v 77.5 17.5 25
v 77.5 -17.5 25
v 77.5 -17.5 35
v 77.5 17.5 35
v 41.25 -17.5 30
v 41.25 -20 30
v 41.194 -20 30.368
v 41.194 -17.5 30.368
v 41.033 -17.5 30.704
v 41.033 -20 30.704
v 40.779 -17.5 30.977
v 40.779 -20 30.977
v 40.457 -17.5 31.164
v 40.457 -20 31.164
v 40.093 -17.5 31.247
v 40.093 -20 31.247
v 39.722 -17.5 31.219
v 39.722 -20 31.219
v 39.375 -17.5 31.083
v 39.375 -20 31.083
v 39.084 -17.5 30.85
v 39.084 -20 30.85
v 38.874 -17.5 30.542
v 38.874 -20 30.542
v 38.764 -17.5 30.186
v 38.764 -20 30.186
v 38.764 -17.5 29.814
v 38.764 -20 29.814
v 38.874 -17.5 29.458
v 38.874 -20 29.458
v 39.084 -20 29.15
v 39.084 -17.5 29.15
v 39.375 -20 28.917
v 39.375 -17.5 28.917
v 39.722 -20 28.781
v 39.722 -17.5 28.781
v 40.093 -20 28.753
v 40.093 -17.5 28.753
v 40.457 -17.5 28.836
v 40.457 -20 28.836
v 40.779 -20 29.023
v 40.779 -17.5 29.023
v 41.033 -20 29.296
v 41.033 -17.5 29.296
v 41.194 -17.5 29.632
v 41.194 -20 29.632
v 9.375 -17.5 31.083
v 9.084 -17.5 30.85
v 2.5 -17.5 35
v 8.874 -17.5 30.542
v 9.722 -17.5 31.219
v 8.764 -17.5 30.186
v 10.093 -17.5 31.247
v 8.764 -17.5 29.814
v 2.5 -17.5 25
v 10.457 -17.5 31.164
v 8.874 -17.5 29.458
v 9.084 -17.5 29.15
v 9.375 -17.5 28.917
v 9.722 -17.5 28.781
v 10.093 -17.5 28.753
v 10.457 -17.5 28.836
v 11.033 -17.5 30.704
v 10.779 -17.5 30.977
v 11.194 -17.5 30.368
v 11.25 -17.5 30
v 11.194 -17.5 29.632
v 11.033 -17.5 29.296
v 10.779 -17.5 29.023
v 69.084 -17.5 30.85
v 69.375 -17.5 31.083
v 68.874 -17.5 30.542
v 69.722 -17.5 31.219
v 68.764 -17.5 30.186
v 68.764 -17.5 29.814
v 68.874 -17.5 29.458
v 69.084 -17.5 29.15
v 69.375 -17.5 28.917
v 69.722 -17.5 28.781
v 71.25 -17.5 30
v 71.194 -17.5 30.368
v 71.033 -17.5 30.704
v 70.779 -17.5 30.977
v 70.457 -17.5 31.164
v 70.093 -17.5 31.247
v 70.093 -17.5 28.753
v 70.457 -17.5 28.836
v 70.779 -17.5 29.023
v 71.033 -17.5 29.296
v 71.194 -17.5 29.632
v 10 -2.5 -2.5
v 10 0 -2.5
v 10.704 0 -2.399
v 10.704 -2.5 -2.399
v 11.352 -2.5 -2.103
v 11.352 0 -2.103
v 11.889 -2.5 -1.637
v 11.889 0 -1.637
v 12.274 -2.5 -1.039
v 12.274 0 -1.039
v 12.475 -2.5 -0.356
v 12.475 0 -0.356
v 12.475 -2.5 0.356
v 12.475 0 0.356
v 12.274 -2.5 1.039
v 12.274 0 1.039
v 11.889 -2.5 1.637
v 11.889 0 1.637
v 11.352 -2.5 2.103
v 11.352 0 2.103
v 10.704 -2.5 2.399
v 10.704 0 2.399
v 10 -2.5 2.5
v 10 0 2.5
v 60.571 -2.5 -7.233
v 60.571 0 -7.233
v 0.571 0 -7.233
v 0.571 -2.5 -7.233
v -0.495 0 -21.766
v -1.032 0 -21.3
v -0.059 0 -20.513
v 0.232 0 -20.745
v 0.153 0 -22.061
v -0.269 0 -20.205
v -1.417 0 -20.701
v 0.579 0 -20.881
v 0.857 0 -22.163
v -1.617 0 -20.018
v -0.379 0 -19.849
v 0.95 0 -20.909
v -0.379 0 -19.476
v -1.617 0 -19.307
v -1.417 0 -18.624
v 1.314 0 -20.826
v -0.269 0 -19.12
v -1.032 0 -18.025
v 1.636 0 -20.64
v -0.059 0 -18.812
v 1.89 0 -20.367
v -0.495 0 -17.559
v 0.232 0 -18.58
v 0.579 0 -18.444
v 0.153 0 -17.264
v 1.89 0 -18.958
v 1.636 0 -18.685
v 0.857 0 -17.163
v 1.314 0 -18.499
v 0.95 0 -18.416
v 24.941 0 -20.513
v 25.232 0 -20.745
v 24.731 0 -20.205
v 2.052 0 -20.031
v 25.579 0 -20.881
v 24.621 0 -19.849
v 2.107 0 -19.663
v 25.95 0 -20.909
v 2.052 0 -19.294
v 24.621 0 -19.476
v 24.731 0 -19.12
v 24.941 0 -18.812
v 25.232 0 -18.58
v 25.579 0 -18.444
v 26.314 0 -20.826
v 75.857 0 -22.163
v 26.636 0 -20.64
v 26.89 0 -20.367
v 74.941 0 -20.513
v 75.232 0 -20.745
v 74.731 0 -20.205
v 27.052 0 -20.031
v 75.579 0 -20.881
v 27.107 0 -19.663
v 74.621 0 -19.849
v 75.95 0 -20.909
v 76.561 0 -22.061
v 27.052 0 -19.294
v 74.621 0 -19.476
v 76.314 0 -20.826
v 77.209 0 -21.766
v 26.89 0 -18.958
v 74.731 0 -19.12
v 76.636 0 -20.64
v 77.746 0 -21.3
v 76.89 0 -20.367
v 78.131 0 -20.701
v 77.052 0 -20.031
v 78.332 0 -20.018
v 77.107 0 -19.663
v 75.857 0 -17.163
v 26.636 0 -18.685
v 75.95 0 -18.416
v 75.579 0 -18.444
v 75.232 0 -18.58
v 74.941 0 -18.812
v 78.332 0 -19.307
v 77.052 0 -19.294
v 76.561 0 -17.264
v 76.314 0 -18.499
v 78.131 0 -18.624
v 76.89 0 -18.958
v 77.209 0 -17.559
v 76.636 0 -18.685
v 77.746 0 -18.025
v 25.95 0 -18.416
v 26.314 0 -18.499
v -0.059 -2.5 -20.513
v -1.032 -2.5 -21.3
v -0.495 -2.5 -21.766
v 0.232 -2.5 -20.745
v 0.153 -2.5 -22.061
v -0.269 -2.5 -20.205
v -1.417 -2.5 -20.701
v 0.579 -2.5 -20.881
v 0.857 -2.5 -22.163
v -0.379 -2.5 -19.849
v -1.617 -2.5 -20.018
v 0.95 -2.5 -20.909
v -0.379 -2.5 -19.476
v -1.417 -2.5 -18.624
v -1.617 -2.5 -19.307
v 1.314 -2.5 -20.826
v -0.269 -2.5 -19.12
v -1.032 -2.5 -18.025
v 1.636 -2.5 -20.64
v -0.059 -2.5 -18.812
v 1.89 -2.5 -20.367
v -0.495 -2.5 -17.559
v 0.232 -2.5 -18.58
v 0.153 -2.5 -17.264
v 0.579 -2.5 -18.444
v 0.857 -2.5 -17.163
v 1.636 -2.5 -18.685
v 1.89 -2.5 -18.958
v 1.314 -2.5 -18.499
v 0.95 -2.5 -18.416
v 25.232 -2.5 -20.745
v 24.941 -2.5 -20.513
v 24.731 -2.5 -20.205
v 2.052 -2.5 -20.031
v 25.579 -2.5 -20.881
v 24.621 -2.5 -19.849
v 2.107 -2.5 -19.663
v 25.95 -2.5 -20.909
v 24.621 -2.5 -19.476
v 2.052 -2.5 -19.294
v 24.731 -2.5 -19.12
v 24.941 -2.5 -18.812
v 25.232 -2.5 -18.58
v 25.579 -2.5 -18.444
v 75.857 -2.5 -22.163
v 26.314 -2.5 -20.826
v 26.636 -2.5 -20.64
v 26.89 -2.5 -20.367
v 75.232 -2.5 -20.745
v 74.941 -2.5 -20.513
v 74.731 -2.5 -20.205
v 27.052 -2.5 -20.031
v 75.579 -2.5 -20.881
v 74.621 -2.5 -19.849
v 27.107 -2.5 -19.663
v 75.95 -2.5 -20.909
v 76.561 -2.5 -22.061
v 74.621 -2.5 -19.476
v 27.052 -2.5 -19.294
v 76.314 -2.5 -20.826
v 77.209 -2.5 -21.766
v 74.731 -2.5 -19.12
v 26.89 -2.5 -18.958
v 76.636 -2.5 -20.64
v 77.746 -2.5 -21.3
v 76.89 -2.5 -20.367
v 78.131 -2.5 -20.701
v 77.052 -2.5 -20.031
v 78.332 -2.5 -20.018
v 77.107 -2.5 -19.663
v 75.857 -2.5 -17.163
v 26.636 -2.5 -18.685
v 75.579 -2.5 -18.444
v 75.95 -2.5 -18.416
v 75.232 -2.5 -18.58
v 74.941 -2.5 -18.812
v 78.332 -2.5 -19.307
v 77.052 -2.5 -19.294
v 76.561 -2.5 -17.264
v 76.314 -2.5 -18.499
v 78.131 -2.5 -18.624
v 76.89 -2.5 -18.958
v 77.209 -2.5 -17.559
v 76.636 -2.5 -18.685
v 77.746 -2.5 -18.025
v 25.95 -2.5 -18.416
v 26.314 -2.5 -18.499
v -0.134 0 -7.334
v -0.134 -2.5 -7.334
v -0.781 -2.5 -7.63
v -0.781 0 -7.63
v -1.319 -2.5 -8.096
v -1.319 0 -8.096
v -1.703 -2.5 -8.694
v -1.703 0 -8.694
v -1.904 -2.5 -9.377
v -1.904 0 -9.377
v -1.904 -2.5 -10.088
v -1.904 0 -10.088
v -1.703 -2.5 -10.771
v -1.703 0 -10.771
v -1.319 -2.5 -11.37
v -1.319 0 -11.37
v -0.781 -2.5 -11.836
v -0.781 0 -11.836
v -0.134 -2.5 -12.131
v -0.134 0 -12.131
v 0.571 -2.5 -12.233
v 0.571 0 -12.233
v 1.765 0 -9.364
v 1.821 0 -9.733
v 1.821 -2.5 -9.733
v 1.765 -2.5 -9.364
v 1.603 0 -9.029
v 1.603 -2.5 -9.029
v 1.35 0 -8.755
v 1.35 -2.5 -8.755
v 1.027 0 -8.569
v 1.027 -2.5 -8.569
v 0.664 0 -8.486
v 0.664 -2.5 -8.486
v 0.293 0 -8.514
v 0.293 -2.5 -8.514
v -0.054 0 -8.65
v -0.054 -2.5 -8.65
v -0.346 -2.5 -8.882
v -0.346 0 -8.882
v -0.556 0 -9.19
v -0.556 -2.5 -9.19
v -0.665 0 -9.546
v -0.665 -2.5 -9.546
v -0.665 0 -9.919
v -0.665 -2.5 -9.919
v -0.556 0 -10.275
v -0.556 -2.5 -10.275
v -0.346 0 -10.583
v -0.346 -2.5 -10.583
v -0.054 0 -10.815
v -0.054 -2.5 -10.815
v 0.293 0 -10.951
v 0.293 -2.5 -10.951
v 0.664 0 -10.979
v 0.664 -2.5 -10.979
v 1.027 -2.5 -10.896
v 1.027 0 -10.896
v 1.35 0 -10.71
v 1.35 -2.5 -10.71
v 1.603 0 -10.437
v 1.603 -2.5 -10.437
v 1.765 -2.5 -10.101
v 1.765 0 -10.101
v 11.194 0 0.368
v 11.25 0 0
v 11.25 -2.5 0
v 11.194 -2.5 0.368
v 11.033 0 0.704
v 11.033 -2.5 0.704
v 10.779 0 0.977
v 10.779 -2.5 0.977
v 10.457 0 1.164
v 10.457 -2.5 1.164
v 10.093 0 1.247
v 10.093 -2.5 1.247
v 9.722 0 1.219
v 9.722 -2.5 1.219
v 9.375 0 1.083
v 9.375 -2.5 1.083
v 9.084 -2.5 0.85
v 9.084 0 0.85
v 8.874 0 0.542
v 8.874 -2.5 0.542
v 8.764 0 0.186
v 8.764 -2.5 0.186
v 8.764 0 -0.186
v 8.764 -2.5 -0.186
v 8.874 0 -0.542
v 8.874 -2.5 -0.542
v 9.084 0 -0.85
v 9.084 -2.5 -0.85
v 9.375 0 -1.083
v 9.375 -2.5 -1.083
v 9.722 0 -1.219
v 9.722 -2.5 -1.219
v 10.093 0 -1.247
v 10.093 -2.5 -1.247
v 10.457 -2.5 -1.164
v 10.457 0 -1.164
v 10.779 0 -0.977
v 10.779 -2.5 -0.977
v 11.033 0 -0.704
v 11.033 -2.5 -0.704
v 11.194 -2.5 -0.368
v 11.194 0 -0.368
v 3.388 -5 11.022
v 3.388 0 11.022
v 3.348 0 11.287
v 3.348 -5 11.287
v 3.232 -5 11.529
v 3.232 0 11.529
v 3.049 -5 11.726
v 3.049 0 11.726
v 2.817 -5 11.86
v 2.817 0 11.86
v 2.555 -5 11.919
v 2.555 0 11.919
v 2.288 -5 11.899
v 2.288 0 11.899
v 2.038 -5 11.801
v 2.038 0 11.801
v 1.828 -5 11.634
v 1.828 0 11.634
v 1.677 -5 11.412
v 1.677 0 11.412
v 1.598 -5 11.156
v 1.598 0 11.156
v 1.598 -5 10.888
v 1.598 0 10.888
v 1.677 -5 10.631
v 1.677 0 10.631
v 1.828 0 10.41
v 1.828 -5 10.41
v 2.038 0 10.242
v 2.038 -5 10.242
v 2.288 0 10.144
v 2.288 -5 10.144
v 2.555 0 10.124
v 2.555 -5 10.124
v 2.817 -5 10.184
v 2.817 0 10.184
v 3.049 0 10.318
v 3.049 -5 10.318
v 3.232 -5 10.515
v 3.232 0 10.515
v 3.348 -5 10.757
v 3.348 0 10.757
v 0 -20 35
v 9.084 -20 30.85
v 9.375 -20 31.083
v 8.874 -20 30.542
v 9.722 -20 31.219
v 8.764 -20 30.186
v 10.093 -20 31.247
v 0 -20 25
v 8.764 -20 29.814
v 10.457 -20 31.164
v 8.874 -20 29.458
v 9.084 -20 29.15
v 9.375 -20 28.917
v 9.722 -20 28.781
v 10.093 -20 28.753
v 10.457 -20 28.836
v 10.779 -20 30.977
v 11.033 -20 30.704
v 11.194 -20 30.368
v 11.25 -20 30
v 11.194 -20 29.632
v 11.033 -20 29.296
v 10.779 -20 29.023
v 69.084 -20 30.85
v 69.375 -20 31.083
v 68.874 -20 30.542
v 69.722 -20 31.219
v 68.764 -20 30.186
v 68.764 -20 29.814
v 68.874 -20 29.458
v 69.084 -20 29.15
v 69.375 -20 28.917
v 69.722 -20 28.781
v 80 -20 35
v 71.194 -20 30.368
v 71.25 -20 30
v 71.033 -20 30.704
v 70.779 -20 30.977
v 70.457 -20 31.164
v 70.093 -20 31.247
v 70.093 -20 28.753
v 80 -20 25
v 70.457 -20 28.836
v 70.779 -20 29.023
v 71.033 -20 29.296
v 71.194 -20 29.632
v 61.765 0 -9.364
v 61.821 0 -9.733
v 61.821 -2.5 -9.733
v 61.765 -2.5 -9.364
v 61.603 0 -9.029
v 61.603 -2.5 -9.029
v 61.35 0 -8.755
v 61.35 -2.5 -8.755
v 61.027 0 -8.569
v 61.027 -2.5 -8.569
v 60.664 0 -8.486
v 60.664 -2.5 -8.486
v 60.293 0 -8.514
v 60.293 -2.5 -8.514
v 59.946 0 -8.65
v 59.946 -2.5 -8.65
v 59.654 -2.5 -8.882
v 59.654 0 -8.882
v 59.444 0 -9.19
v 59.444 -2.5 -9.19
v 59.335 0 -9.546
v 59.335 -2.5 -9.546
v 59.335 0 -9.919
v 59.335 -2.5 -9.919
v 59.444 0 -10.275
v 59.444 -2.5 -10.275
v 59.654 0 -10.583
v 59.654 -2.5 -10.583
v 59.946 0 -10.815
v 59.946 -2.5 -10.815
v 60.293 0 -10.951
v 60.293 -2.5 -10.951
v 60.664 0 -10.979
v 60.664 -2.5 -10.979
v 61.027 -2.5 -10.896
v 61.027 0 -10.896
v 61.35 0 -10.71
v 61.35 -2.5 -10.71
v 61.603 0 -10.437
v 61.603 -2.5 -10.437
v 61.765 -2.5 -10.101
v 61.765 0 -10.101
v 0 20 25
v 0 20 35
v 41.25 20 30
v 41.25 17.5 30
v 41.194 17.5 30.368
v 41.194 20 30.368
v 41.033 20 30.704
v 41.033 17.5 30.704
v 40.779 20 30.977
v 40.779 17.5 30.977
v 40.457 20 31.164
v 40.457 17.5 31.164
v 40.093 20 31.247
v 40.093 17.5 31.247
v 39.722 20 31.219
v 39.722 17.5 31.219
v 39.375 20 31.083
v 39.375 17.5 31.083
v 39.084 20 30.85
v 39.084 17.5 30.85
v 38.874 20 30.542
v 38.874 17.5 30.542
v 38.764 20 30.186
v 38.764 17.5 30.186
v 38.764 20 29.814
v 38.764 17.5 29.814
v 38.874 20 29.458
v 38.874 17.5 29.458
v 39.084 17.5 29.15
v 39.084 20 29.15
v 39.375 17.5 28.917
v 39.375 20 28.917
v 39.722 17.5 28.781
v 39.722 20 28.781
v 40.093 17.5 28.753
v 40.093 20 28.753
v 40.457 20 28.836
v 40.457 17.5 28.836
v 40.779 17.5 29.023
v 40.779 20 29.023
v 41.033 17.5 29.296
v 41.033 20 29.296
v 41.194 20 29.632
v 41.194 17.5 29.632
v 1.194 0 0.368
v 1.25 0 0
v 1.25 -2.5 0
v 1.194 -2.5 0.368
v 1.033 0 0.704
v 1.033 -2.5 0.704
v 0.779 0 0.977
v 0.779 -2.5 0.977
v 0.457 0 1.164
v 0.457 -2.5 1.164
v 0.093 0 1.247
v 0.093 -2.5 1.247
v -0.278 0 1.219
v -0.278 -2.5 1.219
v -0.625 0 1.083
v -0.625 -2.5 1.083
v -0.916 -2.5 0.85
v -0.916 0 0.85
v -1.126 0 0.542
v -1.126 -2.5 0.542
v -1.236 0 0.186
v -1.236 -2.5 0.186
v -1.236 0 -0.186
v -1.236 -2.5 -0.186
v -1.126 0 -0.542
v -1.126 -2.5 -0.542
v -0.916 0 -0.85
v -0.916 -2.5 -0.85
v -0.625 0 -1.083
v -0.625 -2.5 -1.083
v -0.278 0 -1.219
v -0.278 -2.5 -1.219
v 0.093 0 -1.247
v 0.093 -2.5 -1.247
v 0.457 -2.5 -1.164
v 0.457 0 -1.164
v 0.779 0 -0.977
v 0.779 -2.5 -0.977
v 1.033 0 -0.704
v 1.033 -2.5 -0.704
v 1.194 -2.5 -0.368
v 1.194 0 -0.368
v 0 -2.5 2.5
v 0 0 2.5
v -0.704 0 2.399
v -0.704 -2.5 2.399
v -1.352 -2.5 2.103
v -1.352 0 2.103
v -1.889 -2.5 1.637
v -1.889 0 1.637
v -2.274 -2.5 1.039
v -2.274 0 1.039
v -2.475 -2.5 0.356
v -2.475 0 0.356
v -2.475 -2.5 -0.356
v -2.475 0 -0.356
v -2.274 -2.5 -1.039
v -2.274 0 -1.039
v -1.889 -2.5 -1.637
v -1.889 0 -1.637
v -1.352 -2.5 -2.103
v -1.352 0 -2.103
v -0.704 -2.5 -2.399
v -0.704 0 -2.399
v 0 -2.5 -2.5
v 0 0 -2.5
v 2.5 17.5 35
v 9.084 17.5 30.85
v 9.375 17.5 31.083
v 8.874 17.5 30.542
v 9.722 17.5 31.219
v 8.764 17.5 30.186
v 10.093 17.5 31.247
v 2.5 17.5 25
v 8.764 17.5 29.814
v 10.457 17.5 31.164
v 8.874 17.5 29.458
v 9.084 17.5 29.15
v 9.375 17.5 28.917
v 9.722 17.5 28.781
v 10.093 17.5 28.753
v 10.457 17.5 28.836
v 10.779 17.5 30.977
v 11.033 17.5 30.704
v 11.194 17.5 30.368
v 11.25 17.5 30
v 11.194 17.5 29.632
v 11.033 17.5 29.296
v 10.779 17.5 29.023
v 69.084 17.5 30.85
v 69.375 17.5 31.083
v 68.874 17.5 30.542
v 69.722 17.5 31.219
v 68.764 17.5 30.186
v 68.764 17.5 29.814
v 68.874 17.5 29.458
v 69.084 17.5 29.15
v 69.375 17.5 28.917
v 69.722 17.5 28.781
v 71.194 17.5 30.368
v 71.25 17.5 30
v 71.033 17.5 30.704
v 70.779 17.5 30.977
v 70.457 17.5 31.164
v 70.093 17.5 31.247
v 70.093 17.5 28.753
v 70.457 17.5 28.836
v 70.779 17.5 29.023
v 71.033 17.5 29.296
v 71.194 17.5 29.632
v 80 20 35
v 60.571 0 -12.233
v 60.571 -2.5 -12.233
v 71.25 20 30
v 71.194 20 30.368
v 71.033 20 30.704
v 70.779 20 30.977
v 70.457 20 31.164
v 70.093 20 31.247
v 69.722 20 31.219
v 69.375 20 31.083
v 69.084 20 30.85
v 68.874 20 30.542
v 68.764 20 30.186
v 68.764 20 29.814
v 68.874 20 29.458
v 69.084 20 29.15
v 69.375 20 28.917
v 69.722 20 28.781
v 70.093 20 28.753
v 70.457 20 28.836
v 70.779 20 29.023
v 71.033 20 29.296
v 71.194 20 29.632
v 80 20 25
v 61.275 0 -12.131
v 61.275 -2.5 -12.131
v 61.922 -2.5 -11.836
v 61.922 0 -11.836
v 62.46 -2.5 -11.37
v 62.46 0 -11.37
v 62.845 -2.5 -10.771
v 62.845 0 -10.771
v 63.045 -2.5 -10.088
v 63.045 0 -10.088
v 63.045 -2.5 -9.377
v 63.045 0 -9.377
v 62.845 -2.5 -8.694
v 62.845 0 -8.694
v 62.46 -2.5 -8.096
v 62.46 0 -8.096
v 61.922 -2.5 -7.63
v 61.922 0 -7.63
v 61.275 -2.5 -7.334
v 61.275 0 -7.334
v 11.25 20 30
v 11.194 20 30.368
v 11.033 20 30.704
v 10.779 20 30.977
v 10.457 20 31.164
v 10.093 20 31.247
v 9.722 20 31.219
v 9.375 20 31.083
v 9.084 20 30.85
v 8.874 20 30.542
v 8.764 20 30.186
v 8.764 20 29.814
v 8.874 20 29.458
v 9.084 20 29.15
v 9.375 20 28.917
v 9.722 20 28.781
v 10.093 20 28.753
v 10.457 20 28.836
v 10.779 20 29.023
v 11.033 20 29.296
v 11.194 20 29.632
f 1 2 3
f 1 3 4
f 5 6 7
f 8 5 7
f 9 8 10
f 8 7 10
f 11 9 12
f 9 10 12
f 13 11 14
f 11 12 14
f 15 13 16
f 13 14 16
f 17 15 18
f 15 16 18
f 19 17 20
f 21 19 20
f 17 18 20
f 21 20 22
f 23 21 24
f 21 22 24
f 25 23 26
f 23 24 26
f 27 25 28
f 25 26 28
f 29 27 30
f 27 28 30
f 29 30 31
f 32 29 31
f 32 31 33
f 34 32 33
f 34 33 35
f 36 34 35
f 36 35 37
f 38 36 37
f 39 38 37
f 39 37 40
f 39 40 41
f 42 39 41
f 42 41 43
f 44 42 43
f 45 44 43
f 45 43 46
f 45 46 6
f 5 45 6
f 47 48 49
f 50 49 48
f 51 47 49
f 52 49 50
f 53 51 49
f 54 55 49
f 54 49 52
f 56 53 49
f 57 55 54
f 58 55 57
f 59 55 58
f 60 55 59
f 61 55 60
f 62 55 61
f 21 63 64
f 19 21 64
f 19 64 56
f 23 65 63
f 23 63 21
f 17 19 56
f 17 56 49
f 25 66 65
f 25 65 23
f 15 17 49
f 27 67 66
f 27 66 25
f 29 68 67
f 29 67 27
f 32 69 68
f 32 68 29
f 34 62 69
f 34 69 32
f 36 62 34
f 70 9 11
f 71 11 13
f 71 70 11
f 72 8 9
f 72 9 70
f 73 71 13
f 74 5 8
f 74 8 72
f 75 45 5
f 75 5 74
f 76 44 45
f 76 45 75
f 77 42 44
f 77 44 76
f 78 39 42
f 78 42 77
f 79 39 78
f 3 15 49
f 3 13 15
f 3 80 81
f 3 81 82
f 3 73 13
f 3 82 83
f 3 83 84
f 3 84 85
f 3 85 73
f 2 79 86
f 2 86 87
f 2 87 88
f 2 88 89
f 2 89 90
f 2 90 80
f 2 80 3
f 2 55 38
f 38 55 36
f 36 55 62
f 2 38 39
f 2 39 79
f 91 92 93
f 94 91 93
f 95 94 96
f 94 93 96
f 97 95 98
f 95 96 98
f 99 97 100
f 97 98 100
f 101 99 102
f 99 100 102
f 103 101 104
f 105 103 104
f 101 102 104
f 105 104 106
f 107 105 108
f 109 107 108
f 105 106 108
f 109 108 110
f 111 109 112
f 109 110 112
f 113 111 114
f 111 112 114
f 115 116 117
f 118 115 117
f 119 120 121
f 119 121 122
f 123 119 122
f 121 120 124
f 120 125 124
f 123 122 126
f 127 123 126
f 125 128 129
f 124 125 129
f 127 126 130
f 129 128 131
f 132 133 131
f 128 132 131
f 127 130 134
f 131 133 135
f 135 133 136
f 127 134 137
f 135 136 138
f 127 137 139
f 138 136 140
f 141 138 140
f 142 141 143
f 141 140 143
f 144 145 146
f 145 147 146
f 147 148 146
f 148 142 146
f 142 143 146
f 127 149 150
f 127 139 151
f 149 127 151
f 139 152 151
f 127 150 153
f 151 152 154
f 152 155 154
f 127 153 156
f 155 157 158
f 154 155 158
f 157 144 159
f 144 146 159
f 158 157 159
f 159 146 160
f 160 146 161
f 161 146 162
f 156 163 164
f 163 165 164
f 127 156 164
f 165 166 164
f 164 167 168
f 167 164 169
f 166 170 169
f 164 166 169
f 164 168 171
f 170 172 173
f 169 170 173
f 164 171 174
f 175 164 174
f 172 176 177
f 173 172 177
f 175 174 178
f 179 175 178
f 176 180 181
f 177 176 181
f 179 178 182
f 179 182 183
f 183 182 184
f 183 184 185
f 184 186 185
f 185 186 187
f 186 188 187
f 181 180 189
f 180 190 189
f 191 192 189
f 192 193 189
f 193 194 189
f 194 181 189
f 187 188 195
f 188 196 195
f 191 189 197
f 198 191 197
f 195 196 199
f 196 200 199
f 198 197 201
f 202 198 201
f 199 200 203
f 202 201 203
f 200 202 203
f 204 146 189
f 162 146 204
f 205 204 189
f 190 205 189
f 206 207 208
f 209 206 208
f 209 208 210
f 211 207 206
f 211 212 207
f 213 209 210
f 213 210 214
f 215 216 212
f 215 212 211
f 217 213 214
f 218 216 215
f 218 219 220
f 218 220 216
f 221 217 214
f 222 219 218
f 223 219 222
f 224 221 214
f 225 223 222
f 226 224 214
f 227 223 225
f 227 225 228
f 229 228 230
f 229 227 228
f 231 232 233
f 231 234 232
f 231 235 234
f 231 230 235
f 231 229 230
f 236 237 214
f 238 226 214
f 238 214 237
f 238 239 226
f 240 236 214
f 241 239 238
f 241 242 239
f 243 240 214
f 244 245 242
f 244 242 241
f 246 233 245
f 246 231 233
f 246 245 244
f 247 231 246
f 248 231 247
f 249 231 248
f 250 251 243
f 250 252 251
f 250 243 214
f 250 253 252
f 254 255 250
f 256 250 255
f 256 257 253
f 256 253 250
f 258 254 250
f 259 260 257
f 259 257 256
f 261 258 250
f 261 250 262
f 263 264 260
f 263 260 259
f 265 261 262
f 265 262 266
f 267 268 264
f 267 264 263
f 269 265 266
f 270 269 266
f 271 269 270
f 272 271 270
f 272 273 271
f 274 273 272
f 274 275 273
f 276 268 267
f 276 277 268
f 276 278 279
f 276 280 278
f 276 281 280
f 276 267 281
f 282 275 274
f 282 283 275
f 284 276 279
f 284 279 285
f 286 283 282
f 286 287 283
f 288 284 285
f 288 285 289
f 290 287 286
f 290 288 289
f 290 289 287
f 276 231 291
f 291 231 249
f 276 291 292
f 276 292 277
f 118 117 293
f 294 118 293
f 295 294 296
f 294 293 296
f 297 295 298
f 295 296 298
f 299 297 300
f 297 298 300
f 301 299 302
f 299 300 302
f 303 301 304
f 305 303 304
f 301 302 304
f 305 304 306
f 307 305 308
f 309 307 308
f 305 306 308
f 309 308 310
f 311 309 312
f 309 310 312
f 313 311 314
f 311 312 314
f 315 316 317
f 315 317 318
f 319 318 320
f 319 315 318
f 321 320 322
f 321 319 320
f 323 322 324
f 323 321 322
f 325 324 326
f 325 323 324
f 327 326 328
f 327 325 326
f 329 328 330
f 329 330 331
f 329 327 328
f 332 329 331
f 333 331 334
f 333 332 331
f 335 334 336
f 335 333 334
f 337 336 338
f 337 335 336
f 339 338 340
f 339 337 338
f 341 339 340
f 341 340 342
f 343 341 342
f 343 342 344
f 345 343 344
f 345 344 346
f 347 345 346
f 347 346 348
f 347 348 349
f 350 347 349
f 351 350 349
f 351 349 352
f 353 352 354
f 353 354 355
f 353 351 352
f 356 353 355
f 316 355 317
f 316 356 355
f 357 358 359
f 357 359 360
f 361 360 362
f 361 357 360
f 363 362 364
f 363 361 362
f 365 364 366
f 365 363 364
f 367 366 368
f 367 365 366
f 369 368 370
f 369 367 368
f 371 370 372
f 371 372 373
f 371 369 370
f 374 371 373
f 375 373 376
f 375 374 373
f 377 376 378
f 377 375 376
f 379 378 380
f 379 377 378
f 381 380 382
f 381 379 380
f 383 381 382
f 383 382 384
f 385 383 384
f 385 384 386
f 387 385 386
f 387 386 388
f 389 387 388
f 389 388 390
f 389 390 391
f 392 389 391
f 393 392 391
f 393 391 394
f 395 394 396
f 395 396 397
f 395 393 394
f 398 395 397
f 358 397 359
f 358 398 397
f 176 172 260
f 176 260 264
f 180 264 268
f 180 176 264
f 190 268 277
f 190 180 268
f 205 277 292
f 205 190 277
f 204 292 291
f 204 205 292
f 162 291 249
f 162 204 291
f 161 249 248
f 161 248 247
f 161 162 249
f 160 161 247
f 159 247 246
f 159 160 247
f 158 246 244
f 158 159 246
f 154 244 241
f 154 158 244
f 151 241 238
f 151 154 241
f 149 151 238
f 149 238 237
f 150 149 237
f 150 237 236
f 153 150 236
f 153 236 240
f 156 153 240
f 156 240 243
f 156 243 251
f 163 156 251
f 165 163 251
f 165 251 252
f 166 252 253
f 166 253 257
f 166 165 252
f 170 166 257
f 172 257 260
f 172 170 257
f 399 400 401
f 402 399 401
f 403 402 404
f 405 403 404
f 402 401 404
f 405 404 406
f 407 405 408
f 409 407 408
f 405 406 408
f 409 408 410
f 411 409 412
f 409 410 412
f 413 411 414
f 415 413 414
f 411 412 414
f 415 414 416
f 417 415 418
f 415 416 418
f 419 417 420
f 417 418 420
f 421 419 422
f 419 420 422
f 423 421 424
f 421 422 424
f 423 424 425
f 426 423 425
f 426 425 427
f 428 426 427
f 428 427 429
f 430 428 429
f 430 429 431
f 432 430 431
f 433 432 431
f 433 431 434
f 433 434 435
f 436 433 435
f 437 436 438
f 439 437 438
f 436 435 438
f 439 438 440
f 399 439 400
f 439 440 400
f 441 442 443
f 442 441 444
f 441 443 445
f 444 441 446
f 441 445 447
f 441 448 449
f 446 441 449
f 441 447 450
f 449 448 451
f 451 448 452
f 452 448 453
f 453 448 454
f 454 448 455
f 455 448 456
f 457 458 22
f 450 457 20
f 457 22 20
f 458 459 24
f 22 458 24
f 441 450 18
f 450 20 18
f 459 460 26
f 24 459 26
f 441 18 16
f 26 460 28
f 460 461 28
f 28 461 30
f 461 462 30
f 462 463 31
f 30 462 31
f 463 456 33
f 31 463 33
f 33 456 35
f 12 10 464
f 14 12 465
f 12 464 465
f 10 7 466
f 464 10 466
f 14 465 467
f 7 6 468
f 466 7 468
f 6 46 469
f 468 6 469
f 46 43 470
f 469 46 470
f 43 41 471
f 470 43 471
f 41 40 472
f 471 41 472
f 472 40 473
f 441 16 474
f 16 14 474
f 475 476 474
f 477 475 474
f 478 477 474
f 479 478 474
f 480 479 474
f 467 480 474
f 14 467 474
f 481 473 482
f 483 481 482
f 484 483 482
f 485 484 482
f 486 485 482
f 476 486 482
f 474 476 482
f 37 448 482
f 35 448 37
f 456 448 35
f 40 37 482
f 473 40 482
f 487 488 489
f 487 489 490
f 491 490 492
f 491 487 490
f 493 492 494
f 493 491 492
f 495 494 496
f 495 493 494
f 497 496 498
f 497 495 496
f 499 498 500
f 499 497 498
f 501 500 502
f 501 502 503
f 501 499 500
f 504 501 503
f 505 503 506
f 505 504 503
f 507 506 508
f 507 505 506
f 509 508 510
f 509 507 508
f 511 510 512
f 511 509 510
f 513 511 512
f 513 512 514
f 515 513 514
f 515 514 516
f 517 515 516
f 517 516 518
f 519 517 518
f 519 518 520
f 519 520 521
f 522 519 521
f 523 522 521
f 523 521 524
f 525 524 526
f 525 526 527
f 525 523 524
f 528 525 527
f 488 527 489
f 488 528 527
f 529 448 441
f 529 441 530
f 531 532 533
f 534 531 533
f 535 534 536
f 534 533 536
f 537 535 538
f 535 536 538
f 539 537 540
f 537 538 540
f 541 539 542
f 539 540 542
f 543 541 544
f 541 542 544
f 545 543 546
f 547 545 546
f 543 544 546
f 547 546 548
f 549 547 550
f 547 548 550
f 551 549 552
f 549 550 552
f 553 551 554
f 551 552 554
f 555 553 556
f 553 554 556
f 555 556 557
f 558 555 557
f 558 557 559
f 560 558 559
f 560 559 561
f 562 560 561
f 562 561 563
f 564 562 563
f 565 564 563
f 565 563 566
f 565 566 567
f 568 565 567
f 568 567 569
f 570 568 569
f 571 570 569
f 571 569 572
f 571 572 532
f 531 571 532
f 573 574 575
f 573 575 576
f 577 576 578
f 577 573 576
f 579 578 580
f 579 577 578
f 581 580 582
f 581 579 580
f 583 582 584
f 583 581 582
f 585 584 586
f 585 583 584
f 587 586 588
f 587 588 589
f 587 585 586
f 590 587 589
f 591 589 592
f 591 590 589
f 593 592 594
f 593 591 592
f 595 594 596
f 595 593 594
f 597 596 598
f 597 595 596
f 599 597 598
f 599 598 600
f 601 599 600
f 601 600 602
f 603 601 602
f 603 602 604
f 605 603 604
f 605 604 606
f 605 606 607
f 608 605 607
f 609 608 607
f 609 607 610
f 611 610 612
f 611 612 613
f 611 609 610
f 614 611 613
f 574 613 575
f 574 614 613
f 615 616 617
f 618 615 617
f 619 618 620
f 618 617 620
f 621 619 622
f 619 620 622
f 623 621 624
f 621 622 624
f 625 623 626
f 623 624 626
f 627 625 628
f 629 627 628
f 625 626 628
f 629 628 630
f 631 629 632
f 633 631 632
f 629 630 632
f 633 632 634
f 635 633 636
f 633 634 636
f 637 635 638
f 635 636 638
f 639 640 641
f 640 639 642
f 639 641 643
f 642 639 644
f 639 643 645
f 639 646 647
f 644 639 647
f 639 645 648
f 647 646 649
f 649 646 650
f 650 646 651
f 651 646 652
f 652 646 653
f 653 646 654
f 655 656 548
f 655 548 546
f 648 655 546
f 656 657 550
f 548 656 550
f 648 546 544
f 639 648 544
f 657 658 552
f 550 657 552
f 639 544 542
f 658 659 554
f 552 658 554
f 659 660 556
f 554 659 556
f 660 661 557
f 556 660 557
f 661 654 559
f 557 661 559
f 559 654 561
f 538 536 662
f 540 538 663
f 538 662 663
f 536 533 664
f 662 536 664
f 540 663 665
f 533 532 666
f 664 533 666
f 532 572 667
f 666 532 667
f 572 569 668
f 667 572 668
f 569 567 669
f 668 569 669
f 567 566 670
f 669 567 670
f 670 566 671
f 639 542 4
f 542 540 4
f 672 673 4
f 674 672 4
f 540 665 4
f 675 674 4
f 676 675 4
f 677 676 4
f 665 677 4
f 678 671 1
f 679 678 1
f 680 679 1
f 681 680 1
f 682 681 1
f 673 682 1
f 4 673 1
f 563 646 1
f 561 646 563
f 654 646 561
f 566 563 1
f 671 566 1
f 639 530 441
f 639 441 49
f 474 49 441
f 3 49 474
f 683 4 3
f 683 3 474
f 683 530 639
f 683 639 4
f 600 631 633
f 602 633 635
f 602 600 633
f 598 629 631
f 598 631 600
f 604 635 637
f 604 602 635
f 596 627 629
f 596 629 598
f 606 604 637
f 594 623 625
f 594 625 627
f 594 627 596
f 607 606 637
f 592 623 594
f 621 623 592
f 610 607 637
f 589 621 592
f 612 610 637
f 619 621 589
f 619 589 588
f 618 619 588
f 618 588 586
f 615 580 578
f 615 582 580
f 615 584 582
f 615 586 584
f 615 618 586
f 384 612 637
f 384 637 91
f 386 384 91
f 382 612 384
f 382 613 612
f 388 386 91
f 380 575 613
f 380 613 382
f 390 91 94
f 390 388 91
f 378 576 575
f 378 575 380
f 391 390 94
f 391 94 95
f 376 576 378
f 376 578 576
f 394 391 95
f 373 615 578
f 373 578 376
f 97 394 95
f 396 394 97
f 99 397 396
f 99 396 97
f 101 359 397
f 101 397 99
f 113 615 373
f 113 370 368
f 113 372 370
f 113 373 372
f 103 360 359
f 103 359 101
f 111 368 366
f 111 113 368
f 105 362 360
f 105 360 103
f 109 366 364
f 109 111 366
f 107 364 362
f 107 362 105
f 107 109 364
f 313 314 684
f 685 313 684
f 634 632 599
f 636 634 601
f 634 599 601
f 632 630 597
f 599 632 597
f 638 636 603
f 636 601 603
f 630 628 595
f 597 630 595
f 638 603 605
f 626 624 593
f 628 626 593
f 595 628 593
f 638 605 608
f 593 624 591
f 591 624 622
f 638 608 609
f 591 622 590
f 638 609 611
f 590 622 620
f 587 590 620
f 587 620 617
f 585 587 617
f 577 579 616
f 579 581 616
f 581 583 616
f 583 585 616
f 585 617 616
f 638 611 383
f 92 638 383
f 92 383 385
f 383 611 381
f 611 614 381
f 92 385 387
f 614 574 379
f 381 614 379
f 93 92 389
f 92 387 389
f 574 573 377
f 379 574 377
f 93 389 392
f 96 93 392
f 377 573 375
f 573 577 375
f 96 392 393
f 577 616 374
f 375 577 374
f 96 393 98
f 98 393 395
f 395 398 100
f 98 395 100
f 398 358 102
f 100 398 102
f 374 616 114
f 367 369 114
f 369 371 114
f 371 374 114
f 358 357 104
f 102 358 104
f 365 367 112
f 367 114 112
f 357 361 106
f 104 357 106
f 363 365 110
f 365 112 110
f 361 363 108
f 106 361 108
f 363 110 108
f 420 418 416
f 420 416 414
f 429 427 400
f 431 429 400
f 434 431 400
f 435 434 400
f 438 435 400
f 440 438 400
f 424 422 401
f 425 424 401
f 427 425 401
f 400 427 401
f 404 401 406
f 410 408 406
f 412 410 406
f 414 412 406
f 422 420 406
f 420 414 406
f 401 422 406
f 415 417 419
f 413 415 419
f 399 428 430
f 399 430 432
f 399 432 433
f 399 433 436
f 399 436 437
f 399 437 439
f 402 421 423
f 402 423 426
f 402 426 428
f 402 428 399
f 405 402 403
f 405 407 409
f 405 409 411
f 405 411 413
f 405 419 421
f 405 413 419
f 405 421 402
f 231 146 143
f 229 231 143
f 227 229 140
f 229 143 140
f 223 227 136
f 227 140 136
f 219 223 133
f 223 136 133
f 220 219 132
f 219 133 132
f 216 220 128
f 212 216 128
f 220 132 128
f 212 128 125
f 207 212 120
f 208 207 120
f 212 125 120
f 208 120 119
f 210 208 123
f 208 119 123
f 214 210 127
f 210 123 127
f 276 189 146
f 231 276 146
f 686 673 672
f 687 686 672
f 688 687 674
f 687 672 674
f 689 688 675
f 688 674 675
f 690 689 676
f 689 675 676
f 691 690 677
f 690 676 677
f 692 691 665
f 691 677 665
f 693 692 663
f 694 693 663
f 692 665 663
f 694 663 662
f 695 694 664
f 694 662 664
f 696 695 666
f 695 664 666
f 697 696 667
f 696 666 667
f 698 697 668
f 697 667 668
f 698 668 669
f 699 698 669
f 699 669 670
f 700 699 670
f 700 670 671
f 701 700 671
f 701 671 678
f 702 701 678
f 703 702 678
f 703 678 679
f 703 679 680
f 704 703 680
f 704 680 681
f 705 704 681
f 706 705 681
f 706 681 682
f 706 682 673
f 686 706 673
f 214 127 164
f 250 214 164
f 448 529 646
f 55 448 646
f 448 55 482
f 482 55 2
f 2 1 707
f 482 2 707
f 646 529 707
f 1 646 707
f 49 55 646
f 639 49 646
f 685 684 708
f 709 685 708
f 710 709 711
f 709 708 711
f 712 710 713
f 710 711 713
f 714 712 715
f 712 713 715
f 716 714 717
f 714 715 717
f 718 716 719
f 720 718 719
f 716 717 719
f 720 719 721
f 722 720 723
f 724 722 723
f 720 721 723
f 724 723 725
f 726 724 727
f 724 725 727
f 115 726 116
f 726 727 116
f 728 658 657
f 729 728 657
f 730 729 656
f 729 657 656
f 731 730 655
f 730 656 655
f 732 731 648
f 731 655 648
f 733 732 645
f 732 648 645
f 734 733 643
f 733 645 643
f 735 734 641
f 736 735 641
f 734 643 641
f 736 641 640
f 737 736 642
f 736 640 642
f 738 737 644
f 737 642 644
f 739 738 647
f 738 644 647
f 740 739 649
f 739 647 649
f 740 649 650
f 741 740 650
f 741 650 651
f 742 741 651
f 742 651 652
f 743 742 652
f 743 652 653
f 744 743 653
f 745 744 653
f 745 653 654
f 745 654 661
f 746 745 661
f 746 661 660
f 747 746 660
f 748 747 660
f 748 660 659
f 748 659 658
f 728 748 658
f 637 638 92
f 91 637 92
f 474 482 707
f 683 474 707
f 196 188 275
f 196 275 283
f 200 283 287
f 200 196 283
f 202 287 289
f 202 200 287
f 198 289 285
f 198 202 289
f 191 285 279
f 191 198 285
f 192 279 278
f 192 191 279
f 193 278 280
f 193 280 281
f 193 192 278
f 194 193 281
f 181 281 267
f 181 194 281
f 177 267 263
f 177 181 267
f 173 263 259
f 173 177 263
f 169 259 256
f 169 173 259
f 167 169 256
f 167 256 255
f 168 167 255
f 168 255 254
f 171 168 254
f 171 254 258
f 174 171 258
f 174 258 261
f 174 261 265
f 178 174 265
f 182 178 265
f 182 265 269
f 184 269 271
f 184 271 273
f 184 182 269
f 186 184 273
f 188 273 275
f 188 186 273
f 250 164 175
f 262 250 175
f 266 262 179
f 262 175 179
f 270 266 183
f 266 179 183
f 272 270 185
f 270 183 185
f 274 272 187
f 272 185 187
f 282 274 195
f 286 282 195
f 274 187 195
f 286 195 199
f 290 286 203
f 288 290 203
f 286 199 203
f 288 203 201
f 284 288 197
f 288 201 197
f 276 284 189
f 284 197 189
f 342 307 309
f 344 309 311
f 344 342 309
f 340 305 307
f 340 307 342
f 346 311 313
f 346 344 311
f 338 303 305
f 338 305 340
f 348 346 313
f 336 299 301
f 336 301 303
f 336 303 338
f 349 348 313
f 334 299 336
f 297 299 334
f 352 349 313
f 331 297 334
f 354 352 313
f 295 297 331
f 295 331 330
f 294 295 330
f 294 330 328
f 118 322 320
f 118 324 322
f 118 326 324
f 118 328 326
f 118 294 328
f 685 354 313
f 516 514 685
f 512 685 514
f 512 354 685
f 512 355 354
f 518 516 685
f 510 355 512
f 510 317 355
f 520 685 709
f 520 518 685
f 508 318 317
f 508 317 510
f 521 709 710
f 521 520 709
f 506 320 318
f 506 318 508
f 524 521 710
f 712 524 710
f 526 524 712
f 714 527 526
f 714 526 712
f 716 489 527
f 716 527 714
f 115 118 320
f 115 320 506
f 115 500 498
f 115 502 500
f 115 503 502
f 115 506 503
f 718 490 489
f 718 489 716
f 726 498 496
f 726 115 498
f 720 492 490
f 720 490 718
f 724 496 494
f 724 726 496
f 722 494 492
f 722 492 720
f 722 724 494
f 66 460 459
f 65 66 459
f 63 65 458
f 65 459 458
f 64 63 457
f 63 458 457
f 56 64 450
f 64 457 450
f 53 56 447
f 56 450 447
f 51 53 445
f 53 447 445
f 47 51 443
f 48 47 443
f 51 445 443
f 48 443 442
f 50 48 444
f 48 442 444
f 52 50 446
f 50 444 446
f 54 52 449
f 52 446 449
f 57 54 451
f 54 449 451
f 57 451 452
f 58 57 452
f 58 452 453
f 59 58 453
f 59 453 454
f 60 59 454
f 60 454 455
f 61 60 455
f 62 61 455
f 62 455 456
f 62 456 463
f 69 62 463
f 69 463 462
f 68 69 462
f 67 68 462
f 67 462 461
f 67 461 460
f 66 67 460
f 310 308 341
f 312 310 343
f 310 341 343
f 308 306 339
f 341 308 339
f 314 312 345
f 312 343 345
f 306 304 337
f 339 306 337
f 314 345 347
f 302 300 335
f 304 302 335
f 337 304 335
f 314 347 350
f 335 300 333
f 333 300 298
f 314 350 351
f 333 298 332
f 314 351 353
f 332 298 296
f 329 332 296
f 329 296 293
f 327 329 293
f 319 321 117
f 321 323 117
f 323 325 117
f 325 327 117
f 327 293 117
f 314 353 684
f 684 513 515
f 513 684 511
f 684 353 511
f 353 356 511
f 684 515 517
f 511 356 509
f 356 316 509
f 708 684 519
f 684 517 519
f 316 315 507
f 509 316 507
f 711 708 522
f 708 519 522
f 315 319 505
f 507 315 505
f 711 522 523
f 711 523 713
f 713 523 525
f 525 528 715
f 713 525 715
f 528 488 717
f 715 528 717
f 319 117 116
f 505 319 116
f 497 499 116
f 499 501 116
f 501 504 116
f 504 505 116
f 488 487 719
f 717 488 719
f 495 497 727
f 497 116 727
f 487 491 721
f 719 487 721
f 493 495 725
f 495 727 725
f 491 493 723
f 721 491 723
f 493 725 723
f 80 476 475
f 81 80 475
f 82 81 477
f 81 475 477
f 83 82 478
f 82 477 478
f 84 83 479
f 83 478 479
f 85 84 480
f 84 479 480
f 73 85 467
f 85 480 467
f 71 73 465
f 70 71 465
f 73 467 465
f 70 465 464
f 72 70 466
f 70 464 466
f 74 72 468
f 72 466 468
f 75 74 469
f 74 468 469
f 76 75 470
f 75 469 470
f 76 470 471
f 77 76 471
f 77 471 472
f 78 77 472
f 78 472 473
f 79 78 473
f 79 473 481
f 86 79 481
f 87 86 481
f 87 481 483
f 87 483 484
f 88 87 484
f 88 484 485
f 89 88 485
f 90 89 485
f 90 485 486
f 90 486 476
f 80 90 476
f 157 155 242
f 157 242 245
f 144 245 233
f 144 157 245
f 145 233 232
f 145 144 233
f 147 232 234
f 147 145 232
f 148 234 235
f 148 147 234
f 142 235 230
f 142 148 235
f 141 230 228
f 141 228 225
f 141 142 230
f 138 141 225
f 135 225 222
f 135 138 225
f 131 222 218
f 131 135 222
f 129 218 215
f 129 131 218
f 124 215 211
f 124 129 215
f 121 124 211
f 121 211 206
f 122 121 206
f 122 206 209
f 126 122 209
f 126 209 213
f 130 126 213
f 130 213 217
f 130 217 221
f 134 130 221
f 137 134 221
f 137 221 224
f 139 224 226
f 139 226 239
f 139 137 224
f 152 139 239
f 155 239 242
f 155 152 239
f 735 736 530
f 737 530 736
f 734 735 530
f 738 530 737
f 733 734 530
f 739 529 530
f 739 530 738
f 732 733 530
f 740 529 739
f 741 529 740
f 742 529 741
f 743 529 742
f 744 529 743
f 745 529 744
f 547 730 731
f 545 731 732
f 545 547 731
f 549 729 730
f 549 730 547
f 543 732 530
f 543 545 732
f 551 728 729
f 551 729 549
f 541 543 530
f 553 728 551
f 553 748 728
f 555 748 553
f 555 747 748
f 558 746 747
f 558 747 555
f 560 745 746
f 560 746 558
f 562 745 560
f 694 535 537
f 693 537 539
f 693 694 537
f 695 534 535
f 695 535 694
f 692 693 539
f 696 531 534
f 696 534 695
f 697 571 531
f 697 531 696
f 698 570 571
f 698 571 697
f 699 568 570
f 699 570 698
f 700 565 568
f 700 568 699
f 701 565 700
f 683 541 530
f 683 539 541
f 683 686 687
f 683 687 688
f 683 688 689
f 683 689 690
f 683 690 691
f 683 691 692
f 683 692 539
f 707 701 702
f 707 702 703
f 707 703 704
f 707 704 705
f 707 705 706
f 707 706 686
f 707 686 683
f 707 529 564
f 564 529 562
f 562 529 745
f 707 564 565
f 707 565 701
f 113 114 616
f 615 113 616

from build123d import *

# Parameters (mm, degrees)
F1_R      = 1.25
F2_DEPTH  = 2.5
F3_R      = 1.25
F4_DEPTH  = 2.5
F5_R      = 1.25
F6_DEPTH  = 2.5
F8_W      = 80
F8_H      = 40
F8_W_2    = 75
F8_H_2    = 35
F9_DEPTH  = 10
F10_R     = 1.25
F11_DEPTH = 40.001
F12_R     = 0.9
F13_DEPTH = 5


with BuildPart() as f2:
    # F1 (on Front) → F2 (new body)
    with BuildSketch(Plane.XZ):
        with BuildLine():
            Line((10, 2.5), (0, 2.5))
            ThreePointArc((0, 2.5), (-2.5, 0), (0, -2.5))
            Line((0, -2.5), (10, -2.5))
            ThreePointArc((10, -2.5), (12.5, 0), (10, 2.5))
        make_face()
        Circle(F1_R, mode=Mode.SUBTRACT)
        with Locations((10, 0)):
            Circle(F1_R, mode=Mode.SUBTRACT)
    extrude(amount=F2_DEPTH)


with BuildPart() as f4:
    # F3 (on Front) → F4 (new body)
    with BuildSketch(Plane.XZ):
        with BuildLine():
            Line((60.5706622079, -7.232673876), (0.5706622079, -7.232673876))
            ThreePointArc((0.5706622079, -7.232673876), (-1.9293377921, -9.732673876), (0.5706622079, -12.232673876))
            Line((0.5706622079, -12.232673876), (60.5706622079, -12.232673876))
            ThreePointArc((60.5706622079, -12.232673876), (63.0706622079, -9.732673876), (60.5706622079, -7.232673876))
        make_face()
        with Locations((0.5706622079, -9.732673876)):
            Circle(F3_R, mode=Mode.SUBTRACT)
        with Locations((60.5706622079, -9.732673876)):
            Circle(F3_R, mode=Mode.SUBTRACT)
    extrude(amount=F4_DEPTH)


with BuildPart() as f6:
    # F5 (on Front) → F6 (new body)
    with BuildSketch(Plane.XZ):
        with BuildLine():
            Line((75.8570737601, -17.1626018733), (0.8570737601, -17.1626018733))
            ThreePointArc((0.8570737601, -17.1626018733), (-1.6429262399, -19.6626018733), (0.8570737601, -22.1626018733))
            Line((0.8570737601, -22.1626018733), (75.8570737601, -22.1626018733))
            ThreePointArc((75.8570737601, -22.1626018733), (78.3570737601, -19.6626018733), (75.8570737601, -17.1626018733))
        make_face()
        with Locations((0.8570737601, -19.6626018733)):
            Circle(F5_R, mode=Mode.SUBTRACT)
        with Locations((25.8570737601, -19.6626018733)):
            Circle(F5_R, mode=Mode.SUBTRACT)
        with Locations((75.8570737601, -19.6626018733)):
            Circle(F5_R, mode=Mode.SUBTRACT)
    extrude(amount=F6_DEPTH)


with BuildPart() as f9:
    # F8 (on offset) → F9 (new body)
    with BuildSketch(Plane.XY.offset(25)):
        with Locations((40, 0)):
            Rectangle(F8_W, F8_H)
        with Locations((40, 0)):
            Rectangle(F8_W_2, F8_H_2, mode=Mode.SUBTRACT)
    extrude(amount=F9_DEPTH)

    # F10 (on face) → F11 (cut, through all)
    with BuildSketch(Plane.XZ.offset(20)):
        with Locations((10, 30)):
            Circle(F10_R)
        with Locations((70, 30)):
            Circle(F10_R)
        with Locations((40, 30)):
            Circle(F10_R)
    extrude(amount=-F11_DEPTH, mode=Mode.SUBTRACT)


with BuildPart() as f13:
    # F12 (on Front) → F13 (new body)
    with BuildSketch(Plane.XZ):
        with Locations((2.488047583, 11.0218990594)):
            Circle(F12_R)
    extrude(amount=F13_DEPTH)


solid = Compound([f2.part, f4.part, f6.part, f9.part, f13.part])
